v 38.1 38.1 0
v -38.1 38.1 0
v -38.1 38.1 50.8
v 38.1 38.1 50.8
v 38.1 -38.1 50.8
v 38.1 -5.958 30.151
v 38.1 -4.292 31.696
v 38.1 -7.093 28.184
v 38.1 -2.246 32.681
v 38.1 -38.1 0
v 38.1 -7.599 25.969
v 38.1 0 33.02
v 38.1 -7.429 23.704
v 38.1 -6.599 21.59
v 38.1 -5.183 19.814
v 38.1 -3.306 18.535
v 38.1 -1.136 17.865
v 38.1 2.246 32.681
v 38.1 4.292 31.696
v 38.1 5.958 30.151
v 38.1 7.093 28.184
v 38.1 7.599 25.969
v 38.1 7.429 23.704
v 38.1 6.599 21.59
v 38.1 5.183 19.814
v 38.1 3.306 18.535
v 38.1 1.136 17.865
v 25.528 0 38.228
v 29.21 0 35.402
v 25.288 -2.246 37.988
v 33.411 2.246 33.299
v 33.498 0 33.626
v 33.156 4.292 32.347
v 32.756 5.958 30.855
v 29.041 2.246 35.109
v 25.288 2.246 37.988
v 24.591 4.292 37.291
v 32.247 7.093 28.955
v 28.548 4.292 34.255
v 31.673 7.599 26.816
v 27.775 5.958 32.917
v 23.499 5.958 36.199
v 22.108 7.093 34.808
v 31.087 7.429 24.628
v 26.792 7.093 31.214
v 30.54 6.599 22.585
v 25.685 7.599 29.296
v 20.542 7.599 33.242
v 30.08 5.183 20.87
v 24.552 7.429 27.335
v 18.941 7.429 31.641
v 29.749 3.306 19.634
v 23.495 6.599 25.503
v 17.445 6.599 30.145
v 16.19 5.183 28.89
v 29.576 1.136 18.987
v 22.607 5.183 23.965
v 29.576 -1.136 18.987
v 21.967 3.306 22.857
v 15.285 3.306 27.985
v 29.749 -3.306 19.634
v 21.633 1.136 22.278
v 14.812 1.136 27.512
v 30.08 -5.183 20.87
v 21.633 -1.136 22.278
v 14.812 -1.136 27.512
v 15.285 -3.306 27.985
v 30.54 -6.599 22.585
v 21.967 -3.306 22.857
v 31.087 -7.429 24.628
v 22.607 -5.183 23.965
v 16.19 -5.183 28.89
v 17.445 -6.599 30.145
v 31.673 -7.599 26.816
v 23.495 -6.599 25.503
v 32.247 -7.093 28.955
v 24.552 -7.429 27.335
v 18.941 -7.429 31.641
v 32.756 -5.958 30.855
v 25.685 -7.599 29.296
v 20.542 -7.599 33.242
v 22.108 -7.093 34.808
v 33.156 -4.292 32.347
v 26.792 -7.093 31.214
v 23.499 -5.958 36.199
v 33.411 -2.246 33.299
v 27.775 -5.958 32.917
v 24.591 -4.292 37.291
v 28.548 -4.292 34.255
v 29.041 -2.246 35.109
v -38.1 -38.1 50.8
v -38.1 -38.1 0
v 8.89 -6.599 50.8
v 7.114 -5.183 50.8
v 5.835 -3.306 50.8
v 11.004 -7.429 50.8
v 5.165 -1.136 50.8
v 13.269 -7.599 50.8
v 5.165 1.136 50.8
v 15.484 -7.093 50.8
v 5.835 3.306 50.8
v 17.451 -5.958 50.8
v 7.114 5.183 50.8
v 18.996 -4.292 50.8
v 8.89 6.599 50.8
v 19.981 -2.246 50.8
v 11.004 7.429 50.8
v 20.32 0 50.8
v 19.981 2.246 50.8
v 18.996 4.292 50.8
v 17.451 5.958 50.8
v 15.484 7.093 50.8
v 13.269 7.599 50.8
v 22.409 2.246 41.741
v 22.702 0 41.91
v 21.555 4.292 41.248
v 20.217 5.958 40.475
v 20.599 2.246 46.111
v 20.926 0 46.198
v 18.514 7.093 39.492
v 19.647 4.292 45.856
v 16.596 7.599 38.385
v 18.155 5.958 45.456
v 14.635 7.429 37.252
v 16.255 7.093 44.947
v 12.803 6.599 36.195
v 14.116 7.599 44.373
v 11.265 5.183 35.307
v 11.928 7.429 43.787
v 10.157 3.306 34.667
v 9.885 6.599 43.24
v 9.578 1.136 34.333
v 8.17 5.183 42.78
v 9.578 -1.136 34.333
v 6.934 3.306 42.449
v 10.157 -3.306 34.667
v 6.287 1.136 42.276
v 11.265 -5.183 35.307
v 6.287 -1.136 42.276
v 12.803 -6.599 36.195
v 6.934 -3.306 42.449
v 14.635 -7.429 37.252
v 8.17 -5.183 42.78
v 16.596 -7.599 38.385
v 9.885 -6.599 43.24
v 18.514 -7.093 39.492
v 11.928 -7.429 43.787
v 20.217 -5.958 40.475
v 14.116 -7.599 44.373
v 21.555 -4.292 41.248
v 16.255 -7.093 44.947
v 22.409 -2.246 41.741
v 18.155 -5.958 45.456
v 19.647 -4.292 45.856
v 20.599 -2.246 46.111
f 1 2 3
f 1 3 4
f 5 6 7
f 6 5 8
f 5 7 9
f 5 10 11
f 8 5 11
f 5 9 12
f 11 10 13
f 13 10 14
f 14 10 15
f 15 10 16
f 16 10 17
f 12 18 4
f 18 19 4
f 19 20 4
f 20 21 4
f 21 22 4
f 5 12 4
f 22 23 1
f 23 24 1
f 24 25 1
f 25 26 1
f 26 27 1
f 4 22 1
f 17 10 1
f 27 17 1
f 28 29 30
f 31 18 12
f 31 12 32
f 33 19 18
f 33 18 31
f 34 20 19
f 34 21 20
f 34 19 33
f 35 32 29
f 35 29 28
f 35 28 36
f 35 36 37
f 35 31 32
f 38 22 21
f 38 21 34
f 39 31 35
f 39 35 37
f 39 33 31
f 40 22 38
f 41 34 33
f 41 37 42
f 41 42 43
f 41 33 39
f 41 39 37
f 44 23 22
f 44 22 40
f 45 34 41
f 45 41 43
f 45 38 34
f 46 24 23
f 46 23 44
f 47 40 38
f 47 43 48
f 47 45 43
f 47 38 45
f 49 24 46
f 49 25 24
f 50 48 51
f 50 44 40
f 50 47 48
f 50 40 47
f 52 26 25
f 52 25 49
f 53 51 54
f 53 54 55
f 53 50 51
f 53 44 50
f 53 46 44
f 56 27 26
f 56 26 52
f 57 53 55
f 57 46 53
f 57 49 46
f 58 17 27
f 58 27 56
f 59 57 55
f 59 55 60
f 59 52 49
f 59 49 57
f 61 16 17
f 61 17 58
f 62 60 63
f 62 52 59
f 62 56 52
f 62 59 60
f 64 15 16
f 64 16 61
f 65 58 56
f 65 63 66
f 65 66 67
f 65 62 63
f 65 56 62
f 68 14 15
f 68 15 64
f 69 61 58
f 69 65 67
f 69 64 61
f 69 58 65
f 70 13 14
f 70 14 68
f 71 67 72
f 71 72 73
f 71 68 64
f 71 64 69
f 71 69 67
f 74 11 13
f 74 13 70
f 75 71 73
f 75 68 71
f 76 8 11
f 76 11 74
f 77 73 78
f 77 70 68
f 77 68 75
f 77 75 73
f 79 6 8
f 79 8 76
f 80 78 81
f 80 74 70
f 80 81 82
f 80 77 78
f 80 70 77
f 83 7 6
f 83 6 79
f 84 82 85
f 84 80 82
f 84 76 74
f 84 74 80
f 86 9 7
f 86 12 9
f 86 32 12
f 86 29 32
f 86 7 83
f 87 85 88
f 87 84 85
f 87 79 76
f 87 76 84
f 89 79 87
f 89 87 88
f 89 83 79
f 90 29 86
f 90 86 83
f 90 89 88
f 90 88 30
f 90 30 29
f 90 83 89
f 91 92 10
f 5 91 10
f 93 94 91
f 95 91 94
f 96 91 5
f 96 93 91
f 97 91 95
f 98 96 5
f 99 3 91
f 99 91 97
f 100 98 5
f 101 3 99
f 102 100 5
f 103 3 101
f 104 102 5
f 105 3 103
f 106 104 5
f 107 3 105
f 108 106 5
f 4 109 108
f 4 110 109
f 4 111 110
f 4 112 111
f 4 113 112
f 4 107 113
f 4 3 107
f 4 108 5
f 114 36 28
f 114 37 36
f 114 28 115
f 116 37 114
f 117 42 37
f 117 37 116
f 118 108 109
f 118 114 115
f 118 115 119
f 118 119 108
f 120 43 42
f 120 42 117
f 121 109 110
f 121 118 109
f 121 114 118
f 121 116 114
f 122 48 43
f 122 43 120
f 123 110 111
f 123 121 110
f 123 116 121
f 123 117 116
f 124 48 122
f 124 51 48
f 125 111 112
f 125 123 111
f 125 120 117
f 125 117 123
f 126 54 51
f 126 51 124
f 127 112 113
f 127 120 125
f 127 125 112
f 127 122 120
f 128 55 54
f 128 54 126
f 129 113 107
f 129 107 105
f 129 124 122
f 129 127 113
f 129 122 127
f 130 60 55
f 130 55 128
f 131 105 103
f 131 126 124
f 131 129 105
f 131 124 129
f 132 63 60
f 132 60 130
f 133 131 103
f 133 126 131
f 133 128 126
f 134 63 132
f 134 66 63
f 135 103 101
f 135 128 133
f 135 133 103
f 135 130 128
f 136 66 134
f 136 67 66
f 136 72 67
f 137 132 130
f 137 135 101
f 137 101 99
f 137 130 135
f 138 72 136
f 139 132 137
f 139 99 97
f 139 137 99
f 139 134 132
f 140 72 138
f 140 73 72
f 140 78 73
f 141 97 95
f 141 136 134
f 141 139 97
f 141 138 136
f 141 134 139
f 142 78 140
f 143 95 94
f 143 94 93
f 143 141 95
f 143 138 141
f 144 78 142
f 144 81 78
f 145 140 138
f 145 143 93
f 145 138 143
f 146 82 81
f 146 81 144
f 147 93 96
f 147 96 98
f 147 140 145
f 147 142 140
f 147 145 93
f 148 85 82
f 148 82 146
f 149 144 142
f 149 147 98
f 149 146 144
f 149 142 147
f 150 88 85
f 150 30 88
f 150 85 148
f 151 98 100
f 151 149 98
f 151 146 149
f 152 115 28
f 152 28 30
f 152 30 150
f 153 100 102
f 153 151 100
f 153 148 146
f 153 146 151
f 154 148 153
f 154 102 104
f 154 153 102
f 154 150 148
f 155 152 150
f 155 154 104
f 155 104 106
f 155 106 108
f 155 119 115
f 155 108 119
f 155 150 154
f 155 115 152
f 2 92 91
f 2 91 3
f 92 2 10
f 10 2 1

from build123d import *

# Parameters (mm, degrees)
SKETCH2_W           = 76.2
SKETCH2_H           = 76.2
BOSS_EXTRUDE1_DEPTH = 50.8
SKETCH3_R           = 7.62


with BuildPart() as part:
    # Sketch2 → Boss-Extrude1 (new body)
    with BuildSketch(Plane.XY):
        Rectangle(SKETCH2_W, SKETCH2_H)
    extrude(amount=BOSS_EXTRUDE1_DEPTH)

    # Sketch3 → Cut-Revolve1 (revolve, cut)
    with BuildSketch(Plane.XY.offset(50.8), mode=Mode.PRIVATE) as cut_revolve1_sk:
        with Locations((12.7, 0)):
            Circle(SKETCH3_R)
    revolve(cut_revolve1_sk.sketch.rotate(Axis((38.1, 38.1, 50.8), (0, 1, 0)), 315), axis=Axis((38.1, 38.1, 50.8), (0, 1, 0)), mode=Mode.SUBTRACT)


solid = part.part
